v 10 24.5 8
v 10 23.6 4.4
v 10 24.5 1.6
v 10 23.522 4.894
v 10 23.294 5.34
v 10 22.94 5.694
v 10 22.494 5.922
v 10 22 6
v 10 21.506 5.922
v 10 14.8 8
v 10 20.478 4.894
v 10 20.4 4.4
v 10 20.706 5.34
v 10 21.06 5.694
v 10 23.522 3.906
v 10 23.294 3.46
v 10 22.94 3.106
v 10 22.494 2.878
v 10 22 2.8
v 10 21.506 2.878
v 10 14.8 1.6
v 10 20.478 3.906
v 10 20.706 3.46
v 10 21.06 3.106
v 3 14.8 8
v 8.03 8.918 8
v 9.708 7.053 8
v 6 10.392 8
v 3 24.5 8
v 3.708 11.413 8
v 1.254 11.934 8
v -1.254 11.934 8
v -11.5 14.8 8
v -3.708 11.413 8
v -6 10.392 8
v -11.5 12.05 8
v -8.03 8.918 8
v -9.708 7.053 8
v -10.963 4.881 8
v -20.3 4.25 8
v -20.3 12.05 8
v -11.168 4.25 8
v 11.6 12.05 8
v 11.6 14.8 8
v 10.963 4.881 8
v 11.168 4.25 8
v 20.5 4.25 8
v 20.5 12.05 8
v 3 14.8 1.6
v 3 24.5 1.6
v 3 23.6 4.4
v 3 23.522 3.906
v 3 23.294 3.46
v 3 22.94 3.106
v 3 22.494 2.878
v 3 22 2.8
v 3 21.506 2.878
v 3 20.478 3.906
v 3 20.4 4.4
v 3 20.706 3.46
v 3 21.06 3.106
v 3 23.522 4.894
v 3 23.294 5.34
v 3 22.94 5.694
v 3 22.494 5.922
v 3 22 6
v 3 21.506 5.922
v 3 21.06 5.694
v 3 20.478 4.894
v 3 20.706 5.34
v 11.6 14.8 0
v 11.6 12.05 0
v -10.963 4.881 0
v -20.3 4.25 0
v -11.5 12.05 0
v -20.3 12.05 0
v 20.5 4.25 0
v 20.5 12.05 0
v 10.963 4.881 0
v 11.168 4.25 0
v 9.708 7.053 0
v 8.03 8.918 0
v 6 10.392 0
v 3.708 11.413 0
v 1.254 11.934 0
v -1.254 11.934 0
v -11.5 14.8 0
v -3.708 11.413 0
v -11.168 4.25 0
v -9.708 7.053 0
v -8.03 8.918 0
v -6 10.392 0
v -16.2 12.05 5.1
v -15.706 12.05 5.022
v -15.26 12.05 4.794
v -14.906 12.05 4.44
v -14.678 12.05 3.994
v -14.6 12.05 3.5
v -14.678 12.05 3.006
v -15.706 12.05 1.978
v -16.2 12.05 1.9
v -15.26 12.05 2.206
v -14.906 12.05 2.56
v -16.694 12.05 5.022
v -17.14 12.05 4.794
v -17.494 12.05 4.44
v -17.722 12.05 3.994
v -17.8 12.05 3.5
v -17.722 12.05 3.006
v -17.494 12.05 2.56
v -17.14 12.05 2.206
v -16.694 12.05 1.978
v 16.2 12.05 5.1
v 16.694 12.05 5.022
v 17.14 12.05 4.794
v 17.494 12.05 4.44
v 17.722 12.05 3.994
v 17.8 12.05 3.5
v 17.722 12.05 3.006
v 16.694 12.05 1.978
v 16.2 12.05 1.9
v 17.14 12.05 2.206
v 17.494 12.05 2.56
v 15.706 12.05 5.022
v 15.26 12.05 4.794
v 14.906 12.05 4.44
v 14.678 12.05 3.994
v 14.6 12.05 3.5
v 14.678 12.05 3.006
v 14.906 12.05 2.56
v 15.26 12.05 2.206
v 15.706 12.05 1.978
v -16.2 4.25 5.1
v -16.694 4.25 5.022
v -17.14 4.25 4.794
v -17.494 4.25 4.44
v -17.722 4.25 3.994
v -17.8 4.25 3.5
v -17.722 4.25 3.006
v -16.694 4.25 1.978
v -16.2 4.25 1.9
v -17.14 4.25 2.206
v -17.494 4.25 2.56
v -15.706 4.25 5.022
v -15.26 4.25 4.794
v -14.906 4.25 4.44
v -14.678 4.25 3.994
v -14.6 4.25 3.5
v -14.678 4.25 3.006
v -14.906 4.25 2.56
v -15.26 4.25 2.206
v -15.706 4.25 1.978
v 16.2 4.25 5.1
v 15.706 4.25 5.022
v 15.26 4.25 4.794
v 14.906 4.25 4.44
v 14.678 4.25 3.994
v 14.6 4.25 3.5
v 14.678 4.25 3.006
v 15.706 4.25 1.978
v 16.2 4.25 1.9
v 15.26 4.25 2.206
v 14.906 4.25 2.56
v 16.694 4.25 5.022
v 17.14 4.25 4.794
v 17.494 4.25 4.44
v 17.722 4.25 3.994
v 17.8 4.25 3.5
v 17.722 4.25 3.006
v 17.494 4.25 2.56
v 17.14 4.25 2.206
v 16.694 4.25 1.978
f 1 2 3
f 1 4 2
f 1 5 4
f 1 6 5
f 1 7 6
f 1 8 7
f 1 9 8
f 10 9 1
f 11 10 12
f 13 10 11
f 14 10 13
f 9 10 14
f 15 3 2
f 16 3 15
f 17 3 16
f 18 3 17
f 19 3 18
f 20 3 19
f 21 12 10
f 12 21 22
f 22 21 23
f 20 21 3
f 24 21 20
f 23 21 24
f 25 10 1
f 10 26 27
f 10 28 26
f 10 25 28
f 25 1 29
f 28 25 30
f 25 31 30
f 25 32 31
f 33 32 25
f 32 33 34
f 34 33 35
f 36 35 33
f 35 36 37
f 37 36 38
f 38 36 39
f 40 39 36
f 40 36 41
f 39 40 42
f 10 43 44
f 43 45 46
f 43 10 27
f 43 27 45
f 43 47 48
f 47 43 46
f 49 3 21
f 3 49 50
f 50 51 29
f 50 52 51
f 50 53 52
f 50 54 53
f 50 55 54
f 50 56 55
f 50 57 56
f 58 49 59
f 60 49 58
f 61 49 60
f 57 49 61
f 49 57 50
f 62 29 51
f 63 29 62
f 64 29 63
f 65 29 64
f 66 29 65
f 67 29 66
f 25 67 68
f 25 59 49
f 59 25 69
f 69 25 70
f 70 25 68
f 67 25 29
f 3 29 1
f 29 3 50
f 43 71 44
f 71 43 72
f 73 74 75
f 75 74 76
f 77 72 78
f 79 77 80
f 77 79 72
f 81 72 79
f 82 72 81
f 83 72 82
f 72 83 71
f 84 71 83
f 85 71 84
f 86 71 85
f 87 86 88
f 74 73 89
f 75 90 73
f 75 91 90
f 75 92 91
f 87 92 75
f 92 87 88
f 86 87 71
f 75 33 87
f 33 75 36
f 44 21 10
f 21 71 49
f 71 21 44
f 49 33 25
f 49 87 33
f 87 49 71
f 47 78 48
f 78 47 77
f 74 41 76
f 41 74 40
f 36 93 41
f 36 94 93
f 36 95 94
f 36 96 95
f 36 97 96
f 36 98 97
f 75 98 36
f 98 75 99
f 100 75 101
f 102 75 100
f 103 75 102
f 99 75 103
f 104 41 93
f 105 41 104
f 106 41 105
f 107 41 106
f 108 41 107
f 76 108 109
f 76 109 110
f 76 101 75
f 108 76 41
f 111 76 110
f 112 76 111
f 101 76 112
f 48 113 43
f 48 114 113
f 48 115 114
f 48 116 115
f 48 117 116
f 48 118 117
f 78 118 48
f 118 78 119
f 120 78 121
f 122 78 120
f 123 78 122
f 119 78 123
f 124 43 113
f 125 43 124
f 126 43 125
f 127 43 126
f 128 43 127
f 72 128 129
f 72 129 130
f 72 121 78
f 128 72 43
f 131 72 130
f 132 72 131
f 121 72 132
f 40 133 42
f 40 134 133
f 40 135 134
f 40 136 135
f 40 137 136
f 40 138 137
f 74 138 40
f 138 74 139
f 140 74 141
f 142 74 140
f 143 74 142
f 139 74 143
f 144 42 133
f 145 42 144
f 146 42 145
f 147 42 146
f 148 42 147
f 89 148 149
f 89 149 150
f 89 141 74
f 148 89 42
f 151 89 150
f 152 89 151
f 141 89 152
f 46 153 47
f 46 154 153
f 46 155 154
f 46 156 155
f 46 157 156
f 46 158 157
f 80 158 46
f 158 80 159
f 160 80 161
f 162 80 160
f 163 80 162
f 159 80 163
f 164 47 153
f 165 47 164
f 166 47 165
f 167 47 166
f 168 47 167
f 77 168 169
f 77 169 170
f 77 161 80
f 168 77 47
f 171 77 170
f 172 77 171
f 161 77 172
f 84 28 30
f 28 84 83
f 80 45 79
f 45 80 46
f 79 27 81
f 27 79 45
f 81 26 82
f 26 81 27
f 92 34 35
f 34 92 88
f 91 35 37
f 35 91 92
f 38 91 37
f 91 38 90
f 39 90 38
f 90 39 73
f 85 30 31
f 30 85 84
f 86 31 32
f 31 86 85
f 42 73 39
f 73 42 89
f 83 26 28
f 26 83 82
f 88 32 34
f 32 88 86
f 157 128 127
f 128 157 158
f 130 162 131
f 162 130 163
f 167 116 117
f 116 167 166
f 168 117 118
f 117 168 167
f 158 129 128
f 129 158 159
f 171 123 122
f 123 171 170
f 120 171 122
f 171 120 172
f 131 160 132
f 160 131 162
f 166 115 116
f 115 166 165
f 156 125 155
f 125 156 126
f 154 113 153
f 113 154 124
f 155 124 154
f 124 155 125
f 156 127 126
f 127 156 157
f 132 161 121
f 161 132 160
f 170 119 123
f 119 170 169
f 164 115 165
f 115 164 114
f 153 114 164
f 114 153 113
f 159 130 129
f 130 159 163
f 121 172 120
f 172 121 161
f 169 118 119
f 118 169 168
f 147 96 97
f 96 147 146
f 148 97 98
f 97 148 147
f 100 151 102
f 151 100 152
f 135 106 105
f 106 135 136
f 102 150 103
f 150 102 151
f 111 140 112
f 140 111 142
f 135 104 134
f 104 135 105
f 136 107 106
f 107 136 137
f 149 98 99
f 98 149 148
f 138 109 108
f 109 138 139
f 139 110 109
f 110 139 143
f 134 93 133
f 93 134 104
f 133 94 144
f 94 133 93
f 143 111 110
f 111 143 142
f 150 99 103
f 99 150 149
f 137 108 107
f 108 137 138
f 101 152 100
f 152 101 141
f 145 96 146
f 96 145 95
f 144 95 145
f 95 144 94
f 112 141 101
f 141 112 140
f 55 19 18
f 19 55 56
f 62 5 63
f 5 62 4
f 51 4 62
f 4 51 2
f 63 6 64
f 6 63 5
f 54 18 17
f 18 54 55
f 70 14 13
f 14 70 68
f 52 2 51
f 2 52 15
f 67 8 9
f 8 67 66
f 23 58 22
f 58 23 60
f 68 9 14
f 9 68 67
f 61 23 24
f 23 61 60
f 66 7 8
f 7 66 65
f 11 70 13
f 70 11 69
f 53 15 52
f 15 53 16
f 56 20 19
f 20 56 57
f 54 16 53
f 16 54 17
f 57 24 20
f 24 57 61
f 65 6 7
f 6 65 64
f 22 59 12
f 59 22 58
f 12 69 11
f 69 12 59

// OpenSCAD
// preview[view:north west, tilt:top diagonal]
// ======= Configuration =======

// Move the fan left/right in relation to the hotend
lateral_offset = 0; 

// Move the fan closer/further away from the hotend
medial_offset = 3.5;

// Modify to compensate for hole shrinkage of your printer
hole_oversize = 0.1;


// ======= Model Generation =========
hole_size = 1.5 + hole_oversize;

difference() {
    union() {
        translate([3 - lateral_offset,13.5,1.6]) cube([7,7.5 + medial_offset,6.4]);
        translate([-11.5,7,0]) cube([23.1,7.8,8]);
        translate([-20.3,4.25,0]) cube([40.8,7.8,8]);
    }
    cylinder(r=12, h=30, center=true);
    translate([16.2,0,3.5]) rotate([90,0,0]) cylinder(r=hole_size, h=30, center=true, $fn=20);
    translate([-16.2,0,3.5]) rotate([90,0,0]) cylinder(r=hole_size, h=30, center=true, $fn=20);
    
    translate([0,18.5 + medial_offset,4.4]) rotate([90,0,90]) cylinder(r=hole_size, h=30, center=true, $fn=20);
}
